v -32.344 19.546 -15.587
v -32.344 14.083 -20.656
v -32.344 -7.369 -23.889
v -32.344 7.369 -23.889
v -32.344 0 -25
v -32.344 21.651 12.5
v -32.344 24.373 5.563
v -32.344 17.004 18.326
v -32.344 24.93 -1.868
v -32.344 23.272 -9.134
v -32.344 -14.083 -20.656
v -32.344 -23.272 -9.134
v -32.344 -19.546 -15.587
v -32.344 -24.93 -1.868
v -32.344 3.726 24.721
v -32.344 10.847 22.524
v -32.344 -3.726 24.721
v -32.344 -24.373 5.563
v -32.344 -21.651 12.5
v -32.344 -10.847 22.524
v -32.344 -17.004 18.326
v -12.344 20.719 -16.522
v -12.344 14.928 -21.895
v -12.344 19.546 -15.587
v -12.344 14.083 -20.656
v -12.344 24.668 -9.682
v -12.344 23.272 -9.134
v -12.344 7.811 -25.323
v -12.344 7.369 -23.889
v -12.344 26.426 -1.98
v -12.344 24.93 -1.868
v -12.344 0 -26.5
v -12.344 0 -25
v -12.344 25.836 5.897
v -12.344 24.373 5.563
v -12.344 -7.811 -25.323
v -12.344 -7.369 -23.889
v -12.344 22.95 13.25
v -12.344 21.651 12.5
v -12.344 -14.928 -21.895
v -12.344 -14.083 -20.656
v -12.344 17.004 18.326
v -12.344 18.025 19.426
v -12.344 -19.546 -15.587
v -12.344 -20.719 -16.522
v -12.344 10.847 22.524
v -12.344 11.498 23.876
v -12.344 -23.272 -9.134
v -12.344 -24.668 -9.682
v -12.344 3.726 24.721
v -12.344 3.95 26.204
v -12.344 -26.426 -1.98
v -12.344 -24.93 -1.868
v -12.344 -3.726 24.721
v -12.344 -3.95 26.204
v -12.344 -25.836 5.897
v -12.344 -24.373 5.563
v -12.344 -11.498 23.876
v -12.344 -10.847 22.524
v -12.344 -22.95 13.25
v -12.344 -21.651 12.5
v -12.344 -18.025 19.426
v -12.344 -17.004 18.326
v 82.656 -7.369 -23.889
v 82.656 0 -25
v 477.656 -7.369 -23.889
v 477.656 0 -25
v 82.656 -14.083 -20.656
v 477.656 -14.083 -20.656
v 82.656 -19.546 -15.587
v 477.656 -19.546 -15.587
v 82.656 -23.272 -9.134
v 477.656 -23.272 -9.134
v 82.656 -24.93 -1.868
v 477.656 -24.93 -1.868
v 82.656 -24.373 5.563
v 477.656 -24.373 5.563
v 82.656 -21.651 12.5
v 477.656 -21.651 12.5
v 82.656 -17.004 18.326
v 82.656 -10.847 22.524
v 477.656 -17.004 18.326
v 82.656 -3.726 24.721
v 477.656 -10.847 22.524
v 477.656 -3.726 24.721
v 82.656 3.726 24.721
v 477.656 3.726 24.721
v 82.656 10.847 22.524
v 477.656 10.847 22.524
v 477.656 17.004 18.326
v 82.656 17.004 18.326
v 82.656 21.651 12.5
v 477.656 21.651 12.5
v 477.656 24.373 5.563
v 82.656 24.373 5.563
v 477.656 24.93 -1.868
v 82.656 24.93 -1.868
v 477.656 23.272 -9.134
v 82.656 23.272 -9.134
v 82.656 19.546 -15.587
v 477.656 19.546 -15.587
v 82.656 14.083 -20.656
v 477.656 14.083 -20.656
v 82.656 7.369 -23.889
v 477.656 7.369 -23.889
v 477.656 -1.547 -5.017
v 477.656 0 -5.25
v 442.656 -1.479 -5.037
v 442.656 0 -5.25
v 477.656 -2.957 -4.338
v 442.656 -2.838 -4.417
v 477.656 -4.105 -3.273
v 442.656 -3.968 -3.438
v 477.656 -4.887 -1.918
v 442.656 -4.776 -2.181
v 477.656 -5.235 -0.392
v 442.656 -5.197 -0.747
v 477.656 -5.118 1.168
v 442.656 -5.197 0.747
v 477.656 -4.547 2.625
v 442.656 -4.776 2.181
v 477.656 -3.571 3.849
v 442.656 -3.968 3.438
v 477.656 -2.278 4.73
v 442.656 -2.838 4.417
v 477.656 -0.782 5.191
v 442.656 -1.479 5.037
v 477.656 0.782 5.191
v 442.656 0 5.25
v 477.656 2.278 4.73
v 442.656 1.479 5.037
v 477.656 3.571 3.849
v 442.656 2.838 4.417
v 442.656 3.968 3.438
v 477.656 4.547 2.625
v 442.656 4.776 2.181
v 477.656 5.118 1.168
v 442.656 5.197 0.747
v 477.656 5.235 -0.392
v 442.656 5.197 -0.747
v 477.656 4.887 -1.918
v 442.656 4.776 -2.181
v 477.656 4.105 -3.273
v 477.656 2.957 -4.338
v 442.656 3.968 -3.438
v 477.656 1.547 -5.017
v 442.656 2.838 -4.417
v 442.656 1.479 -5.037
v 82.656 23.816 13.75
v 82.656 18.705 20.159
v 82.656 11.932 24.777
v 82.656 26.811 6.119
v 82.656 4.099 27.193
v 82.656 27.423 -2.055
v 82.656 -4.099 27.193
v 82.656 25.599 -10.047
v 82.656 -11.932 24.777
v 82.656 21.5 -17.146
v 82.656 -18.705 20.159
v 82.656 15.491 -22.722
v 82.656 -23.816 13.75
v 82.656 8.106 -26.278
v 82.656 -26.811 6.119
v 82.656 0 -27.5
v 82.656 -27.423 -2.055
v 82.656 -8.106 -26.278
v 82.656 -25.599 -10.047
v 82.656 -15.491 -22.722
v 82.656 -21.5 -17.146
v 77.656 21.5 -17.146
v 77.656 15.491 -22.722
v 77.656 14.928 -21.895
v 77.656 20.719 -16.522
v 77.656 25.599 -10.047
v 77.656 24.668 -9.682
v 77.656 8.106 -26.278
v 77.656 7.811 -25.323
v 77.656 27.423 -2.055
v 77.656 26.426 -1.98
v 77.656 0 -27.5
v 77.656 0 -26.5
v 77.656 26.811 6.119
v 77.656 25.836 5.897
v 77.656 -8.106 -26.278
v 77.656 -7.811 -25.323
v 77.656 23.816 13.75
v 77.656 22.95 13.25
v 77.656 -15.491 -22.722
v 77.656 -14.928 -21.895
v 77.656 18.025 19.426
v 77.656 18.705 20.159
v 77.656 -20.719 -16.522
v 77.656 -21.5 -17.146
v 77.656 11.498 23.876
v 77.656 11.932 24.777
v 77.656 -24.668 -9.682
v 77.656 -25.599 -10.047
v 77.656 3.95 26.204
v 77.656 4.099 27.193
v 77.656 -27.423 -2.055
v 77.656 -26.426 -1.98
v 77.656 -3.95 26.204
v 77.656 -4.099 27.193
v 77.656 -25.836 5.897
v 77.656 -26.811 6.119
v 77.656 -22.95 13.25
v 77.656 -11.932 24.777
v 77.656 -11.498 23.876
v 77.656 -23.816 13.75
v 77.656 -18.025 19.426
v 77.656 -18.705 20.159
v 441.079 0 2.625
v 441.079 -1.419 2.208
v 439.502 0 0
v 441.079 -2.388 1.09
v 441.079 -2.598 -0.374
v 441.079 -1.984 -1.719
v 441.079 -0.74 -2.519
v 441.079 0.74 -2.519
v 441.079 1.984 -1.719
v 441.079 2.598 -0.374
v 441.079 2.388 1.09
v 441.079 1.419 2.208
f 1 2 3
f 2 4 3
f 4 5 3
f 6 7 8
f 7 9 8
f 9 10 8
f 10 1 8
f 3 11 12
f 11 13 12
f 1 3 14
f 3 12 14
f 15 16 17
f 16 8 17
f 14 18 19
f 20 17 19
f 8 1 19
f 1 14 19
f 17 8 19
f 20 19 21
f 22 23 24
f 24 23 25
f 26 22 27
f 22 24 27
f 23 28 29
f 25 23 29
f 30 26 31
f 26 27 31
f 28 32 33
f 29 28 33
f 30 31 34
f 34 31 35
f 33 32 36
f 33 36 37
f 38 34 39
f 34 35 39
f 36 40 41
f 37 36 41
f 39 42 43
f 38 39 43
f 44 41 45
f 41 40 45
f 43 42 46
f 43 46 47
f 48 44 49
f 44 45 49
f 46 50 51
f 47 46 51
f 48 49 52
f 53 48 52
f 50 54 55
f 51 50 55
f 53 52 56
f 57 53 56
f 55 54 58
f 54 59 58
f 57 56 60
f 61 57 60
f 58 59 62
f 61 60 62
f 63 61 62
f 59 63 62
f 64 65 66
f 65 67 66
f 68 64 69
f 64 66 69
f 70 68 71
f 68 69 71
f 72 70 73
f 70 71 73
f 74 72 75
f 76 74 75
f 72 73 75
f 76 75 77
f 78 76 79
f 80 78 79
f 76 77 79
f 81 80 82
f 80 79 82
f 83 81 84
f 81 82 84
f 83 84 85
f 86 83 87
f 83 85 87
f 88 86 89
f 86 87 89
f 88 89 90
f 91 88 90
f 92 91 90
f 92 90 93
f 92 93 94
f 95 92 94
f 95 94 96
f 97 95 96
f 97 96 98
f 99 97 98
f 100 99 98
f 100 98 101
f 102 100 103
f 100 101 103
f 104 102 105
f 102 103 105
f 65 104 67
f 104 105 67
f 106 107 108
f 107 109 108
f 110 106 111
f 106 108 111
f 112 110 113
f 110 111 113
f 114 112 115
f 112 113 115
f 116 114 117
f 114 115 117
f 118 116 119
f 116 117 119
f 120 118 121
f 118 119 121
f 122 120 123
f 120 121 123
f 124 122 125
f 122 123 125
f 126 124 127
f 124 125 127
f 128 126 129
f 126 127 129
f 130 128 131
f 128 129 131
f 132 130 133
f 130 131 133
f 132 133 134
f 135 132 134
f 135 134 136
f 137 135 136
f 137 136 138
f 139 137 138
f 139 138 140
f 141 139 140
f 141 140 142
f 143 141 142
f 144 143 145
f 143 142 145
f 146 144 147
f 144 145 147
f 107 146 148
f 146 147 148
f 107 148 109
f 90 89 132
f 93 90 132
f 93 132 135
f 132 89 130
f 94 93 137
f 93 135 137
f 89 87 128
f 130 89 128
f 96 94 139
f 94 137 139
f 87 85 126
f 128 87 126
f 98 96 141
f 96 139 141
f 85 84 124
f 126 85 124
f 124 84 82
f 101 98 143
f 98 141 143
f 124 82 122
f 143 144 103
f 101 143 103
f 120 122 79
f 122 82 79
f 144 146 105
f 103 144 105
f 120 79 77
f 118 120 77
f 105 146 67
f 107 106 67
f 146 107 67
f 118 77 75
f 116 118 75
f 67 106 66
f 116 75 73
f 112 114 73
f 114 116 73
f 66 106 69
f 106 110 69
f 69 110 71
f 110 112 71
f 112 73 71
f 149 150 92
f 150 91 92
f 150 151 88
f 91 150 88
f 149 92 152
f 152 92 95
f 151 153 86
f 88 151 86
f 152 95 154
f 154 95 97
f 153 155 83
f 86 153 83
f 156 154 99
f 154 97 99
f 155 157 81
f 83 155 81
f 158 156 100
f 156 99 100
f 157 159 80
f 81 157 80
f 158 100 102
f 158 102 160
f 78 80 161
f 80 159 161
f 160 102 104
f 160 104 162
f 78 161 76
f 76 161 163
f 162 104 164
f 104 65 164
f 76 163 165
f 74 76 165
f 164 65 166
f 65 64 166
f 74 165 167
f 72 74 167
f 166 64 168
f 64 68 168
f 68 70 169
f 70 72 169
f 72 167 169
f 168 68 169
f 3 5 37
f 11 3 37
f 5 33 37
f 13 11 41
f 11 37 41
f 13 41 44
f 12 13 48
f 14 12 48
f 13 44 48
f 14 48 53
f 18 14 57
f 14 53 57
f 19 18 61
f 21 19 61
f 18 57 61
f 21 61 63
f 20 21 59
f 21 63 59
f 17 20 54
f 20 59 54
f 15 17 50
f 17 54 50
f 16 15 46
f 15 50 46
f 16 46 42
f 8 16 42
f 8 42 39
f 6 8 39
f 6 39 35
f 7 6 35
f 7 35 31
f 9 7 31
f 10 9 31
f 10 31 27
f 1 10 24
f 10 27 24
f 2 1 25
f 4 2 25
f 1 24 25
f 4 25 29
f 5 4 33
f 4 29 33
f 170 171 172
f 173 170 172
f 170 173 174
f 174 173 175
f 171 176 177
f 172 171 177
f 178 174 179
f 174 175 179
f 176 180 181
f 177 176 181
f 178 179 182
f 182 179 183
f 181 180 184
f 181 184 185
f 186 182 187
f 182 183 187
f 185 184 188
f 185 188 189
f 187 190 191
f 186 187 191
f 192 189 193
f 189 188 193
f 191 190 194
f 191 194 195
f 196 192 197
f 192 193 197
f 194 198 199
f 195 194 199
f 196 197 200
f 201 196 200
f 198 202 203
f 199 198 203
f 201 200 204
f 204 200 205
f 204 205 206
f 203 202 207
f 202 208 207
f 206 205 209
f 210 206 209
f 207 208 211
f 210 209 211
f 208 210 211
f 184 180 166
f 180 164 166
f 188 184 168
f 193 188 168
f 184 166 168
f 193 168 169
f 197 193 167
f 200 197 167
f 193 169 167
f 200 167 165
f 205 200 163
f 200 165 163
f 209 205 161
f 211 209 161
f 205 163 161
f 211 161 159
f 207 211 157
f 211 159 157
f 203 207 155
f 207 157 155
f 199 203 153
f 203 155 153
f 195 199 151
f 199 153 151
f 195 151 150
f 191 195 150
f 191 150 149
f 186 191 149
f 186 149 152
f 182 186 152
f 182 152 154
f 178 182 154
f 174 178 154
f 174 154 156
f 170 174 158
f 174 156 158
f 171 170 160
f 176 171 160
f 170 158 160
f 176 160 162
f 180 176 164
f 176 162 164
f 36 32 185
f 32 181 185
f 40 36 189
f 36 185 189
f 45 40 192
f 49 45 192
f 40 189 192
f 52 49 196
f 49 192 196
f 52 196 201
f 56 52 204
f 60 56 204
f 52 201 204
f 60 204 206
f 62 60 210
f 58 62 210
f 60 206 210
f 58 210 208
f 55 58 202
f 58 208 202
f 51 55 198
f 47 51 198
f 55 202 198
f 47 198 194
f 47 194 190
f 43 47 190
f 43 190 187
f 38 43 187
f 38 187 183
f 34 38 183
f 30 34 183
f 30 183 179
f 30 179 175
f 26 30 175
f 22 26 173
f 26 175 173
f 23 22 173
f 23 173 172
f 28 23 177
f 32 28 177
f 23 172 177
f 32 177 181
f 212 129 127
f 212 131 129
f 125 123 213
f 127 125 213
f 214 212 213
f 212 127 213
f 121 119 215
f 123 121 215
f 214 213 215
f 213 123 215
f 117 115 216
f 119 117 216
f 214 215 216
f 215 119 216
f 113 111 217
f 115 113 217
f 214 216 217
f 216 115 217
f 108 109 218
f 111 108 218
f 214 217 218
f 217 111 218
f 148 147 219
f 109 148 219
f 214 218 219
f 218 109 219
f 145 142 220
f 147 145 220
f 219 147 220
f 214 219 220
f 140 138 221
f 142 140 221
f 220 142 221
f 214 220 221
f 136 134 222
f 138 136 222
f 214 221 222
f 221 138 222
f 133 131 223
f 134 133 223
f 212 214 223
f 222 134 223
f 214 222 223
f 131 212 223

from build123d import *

# Parameters (mm, degrees)
F_10_5_10_5_DIAMETER_HOLE1_D     = 10.5
F_10_5_10_5_DIAMETER_HOLE1_DEPTH = 35
F_10_5_10_5_DIAMETER_HOLE1_TIP   = 3.15451825


with BuildPart() as part:
    # Sketch1 → Revolve1 (revolve)
    with BuildSketch(Plane.XY, mode=Mode.PRIVATE) as revolve1_sk:
        Polygon((-32.34392041, -25), (-12.34392041, -25), (-12.34392041, -26.5), (77.65607959, -26.5), (77.65607959, -27.5), (82.65607959, -27.5), (82.65607959, -25), (477.65607959, -25), (477.65607959, 0), (-32.34392041, 0), align=None)
    revolve(revolve1_sk.sketch.rotate(Axis((477.65607959, 0, 0), (-1, 0, 0)), 270), axis=Axis((477.65607959, 0, 0), (-1, 0, 0)))

    # Ø10.5 (10.5) Diameter Hole1
    with Locations(Plane(origin=(477.65607959, 0, 0), x_dir=(0, 0, 1), z_dir=(1, 0, 0))):
        with Locations((0, 0)):
            Hole(F_10_5_10_5_DIAMETER_HOLE1_D / 2, depth=F_10_5_10_5_DIAMETER_HOLE1_DEPTH)
            with Locations((0, 0, -(F_10_5_10_5_DIAMETER_HOLE1_DEPTH + F_10_5_10_5_DIAMETER_HOLE1_TIP / 2))):  # 118° drill point
                Cone(0, F_10_5_10_5_DIAMETER_HOLE1_D / 2, F_10_5_10_5_DIAMETER_HOLE1_TIP, mode=Mode.SUBTRACT)


solid = part.part
